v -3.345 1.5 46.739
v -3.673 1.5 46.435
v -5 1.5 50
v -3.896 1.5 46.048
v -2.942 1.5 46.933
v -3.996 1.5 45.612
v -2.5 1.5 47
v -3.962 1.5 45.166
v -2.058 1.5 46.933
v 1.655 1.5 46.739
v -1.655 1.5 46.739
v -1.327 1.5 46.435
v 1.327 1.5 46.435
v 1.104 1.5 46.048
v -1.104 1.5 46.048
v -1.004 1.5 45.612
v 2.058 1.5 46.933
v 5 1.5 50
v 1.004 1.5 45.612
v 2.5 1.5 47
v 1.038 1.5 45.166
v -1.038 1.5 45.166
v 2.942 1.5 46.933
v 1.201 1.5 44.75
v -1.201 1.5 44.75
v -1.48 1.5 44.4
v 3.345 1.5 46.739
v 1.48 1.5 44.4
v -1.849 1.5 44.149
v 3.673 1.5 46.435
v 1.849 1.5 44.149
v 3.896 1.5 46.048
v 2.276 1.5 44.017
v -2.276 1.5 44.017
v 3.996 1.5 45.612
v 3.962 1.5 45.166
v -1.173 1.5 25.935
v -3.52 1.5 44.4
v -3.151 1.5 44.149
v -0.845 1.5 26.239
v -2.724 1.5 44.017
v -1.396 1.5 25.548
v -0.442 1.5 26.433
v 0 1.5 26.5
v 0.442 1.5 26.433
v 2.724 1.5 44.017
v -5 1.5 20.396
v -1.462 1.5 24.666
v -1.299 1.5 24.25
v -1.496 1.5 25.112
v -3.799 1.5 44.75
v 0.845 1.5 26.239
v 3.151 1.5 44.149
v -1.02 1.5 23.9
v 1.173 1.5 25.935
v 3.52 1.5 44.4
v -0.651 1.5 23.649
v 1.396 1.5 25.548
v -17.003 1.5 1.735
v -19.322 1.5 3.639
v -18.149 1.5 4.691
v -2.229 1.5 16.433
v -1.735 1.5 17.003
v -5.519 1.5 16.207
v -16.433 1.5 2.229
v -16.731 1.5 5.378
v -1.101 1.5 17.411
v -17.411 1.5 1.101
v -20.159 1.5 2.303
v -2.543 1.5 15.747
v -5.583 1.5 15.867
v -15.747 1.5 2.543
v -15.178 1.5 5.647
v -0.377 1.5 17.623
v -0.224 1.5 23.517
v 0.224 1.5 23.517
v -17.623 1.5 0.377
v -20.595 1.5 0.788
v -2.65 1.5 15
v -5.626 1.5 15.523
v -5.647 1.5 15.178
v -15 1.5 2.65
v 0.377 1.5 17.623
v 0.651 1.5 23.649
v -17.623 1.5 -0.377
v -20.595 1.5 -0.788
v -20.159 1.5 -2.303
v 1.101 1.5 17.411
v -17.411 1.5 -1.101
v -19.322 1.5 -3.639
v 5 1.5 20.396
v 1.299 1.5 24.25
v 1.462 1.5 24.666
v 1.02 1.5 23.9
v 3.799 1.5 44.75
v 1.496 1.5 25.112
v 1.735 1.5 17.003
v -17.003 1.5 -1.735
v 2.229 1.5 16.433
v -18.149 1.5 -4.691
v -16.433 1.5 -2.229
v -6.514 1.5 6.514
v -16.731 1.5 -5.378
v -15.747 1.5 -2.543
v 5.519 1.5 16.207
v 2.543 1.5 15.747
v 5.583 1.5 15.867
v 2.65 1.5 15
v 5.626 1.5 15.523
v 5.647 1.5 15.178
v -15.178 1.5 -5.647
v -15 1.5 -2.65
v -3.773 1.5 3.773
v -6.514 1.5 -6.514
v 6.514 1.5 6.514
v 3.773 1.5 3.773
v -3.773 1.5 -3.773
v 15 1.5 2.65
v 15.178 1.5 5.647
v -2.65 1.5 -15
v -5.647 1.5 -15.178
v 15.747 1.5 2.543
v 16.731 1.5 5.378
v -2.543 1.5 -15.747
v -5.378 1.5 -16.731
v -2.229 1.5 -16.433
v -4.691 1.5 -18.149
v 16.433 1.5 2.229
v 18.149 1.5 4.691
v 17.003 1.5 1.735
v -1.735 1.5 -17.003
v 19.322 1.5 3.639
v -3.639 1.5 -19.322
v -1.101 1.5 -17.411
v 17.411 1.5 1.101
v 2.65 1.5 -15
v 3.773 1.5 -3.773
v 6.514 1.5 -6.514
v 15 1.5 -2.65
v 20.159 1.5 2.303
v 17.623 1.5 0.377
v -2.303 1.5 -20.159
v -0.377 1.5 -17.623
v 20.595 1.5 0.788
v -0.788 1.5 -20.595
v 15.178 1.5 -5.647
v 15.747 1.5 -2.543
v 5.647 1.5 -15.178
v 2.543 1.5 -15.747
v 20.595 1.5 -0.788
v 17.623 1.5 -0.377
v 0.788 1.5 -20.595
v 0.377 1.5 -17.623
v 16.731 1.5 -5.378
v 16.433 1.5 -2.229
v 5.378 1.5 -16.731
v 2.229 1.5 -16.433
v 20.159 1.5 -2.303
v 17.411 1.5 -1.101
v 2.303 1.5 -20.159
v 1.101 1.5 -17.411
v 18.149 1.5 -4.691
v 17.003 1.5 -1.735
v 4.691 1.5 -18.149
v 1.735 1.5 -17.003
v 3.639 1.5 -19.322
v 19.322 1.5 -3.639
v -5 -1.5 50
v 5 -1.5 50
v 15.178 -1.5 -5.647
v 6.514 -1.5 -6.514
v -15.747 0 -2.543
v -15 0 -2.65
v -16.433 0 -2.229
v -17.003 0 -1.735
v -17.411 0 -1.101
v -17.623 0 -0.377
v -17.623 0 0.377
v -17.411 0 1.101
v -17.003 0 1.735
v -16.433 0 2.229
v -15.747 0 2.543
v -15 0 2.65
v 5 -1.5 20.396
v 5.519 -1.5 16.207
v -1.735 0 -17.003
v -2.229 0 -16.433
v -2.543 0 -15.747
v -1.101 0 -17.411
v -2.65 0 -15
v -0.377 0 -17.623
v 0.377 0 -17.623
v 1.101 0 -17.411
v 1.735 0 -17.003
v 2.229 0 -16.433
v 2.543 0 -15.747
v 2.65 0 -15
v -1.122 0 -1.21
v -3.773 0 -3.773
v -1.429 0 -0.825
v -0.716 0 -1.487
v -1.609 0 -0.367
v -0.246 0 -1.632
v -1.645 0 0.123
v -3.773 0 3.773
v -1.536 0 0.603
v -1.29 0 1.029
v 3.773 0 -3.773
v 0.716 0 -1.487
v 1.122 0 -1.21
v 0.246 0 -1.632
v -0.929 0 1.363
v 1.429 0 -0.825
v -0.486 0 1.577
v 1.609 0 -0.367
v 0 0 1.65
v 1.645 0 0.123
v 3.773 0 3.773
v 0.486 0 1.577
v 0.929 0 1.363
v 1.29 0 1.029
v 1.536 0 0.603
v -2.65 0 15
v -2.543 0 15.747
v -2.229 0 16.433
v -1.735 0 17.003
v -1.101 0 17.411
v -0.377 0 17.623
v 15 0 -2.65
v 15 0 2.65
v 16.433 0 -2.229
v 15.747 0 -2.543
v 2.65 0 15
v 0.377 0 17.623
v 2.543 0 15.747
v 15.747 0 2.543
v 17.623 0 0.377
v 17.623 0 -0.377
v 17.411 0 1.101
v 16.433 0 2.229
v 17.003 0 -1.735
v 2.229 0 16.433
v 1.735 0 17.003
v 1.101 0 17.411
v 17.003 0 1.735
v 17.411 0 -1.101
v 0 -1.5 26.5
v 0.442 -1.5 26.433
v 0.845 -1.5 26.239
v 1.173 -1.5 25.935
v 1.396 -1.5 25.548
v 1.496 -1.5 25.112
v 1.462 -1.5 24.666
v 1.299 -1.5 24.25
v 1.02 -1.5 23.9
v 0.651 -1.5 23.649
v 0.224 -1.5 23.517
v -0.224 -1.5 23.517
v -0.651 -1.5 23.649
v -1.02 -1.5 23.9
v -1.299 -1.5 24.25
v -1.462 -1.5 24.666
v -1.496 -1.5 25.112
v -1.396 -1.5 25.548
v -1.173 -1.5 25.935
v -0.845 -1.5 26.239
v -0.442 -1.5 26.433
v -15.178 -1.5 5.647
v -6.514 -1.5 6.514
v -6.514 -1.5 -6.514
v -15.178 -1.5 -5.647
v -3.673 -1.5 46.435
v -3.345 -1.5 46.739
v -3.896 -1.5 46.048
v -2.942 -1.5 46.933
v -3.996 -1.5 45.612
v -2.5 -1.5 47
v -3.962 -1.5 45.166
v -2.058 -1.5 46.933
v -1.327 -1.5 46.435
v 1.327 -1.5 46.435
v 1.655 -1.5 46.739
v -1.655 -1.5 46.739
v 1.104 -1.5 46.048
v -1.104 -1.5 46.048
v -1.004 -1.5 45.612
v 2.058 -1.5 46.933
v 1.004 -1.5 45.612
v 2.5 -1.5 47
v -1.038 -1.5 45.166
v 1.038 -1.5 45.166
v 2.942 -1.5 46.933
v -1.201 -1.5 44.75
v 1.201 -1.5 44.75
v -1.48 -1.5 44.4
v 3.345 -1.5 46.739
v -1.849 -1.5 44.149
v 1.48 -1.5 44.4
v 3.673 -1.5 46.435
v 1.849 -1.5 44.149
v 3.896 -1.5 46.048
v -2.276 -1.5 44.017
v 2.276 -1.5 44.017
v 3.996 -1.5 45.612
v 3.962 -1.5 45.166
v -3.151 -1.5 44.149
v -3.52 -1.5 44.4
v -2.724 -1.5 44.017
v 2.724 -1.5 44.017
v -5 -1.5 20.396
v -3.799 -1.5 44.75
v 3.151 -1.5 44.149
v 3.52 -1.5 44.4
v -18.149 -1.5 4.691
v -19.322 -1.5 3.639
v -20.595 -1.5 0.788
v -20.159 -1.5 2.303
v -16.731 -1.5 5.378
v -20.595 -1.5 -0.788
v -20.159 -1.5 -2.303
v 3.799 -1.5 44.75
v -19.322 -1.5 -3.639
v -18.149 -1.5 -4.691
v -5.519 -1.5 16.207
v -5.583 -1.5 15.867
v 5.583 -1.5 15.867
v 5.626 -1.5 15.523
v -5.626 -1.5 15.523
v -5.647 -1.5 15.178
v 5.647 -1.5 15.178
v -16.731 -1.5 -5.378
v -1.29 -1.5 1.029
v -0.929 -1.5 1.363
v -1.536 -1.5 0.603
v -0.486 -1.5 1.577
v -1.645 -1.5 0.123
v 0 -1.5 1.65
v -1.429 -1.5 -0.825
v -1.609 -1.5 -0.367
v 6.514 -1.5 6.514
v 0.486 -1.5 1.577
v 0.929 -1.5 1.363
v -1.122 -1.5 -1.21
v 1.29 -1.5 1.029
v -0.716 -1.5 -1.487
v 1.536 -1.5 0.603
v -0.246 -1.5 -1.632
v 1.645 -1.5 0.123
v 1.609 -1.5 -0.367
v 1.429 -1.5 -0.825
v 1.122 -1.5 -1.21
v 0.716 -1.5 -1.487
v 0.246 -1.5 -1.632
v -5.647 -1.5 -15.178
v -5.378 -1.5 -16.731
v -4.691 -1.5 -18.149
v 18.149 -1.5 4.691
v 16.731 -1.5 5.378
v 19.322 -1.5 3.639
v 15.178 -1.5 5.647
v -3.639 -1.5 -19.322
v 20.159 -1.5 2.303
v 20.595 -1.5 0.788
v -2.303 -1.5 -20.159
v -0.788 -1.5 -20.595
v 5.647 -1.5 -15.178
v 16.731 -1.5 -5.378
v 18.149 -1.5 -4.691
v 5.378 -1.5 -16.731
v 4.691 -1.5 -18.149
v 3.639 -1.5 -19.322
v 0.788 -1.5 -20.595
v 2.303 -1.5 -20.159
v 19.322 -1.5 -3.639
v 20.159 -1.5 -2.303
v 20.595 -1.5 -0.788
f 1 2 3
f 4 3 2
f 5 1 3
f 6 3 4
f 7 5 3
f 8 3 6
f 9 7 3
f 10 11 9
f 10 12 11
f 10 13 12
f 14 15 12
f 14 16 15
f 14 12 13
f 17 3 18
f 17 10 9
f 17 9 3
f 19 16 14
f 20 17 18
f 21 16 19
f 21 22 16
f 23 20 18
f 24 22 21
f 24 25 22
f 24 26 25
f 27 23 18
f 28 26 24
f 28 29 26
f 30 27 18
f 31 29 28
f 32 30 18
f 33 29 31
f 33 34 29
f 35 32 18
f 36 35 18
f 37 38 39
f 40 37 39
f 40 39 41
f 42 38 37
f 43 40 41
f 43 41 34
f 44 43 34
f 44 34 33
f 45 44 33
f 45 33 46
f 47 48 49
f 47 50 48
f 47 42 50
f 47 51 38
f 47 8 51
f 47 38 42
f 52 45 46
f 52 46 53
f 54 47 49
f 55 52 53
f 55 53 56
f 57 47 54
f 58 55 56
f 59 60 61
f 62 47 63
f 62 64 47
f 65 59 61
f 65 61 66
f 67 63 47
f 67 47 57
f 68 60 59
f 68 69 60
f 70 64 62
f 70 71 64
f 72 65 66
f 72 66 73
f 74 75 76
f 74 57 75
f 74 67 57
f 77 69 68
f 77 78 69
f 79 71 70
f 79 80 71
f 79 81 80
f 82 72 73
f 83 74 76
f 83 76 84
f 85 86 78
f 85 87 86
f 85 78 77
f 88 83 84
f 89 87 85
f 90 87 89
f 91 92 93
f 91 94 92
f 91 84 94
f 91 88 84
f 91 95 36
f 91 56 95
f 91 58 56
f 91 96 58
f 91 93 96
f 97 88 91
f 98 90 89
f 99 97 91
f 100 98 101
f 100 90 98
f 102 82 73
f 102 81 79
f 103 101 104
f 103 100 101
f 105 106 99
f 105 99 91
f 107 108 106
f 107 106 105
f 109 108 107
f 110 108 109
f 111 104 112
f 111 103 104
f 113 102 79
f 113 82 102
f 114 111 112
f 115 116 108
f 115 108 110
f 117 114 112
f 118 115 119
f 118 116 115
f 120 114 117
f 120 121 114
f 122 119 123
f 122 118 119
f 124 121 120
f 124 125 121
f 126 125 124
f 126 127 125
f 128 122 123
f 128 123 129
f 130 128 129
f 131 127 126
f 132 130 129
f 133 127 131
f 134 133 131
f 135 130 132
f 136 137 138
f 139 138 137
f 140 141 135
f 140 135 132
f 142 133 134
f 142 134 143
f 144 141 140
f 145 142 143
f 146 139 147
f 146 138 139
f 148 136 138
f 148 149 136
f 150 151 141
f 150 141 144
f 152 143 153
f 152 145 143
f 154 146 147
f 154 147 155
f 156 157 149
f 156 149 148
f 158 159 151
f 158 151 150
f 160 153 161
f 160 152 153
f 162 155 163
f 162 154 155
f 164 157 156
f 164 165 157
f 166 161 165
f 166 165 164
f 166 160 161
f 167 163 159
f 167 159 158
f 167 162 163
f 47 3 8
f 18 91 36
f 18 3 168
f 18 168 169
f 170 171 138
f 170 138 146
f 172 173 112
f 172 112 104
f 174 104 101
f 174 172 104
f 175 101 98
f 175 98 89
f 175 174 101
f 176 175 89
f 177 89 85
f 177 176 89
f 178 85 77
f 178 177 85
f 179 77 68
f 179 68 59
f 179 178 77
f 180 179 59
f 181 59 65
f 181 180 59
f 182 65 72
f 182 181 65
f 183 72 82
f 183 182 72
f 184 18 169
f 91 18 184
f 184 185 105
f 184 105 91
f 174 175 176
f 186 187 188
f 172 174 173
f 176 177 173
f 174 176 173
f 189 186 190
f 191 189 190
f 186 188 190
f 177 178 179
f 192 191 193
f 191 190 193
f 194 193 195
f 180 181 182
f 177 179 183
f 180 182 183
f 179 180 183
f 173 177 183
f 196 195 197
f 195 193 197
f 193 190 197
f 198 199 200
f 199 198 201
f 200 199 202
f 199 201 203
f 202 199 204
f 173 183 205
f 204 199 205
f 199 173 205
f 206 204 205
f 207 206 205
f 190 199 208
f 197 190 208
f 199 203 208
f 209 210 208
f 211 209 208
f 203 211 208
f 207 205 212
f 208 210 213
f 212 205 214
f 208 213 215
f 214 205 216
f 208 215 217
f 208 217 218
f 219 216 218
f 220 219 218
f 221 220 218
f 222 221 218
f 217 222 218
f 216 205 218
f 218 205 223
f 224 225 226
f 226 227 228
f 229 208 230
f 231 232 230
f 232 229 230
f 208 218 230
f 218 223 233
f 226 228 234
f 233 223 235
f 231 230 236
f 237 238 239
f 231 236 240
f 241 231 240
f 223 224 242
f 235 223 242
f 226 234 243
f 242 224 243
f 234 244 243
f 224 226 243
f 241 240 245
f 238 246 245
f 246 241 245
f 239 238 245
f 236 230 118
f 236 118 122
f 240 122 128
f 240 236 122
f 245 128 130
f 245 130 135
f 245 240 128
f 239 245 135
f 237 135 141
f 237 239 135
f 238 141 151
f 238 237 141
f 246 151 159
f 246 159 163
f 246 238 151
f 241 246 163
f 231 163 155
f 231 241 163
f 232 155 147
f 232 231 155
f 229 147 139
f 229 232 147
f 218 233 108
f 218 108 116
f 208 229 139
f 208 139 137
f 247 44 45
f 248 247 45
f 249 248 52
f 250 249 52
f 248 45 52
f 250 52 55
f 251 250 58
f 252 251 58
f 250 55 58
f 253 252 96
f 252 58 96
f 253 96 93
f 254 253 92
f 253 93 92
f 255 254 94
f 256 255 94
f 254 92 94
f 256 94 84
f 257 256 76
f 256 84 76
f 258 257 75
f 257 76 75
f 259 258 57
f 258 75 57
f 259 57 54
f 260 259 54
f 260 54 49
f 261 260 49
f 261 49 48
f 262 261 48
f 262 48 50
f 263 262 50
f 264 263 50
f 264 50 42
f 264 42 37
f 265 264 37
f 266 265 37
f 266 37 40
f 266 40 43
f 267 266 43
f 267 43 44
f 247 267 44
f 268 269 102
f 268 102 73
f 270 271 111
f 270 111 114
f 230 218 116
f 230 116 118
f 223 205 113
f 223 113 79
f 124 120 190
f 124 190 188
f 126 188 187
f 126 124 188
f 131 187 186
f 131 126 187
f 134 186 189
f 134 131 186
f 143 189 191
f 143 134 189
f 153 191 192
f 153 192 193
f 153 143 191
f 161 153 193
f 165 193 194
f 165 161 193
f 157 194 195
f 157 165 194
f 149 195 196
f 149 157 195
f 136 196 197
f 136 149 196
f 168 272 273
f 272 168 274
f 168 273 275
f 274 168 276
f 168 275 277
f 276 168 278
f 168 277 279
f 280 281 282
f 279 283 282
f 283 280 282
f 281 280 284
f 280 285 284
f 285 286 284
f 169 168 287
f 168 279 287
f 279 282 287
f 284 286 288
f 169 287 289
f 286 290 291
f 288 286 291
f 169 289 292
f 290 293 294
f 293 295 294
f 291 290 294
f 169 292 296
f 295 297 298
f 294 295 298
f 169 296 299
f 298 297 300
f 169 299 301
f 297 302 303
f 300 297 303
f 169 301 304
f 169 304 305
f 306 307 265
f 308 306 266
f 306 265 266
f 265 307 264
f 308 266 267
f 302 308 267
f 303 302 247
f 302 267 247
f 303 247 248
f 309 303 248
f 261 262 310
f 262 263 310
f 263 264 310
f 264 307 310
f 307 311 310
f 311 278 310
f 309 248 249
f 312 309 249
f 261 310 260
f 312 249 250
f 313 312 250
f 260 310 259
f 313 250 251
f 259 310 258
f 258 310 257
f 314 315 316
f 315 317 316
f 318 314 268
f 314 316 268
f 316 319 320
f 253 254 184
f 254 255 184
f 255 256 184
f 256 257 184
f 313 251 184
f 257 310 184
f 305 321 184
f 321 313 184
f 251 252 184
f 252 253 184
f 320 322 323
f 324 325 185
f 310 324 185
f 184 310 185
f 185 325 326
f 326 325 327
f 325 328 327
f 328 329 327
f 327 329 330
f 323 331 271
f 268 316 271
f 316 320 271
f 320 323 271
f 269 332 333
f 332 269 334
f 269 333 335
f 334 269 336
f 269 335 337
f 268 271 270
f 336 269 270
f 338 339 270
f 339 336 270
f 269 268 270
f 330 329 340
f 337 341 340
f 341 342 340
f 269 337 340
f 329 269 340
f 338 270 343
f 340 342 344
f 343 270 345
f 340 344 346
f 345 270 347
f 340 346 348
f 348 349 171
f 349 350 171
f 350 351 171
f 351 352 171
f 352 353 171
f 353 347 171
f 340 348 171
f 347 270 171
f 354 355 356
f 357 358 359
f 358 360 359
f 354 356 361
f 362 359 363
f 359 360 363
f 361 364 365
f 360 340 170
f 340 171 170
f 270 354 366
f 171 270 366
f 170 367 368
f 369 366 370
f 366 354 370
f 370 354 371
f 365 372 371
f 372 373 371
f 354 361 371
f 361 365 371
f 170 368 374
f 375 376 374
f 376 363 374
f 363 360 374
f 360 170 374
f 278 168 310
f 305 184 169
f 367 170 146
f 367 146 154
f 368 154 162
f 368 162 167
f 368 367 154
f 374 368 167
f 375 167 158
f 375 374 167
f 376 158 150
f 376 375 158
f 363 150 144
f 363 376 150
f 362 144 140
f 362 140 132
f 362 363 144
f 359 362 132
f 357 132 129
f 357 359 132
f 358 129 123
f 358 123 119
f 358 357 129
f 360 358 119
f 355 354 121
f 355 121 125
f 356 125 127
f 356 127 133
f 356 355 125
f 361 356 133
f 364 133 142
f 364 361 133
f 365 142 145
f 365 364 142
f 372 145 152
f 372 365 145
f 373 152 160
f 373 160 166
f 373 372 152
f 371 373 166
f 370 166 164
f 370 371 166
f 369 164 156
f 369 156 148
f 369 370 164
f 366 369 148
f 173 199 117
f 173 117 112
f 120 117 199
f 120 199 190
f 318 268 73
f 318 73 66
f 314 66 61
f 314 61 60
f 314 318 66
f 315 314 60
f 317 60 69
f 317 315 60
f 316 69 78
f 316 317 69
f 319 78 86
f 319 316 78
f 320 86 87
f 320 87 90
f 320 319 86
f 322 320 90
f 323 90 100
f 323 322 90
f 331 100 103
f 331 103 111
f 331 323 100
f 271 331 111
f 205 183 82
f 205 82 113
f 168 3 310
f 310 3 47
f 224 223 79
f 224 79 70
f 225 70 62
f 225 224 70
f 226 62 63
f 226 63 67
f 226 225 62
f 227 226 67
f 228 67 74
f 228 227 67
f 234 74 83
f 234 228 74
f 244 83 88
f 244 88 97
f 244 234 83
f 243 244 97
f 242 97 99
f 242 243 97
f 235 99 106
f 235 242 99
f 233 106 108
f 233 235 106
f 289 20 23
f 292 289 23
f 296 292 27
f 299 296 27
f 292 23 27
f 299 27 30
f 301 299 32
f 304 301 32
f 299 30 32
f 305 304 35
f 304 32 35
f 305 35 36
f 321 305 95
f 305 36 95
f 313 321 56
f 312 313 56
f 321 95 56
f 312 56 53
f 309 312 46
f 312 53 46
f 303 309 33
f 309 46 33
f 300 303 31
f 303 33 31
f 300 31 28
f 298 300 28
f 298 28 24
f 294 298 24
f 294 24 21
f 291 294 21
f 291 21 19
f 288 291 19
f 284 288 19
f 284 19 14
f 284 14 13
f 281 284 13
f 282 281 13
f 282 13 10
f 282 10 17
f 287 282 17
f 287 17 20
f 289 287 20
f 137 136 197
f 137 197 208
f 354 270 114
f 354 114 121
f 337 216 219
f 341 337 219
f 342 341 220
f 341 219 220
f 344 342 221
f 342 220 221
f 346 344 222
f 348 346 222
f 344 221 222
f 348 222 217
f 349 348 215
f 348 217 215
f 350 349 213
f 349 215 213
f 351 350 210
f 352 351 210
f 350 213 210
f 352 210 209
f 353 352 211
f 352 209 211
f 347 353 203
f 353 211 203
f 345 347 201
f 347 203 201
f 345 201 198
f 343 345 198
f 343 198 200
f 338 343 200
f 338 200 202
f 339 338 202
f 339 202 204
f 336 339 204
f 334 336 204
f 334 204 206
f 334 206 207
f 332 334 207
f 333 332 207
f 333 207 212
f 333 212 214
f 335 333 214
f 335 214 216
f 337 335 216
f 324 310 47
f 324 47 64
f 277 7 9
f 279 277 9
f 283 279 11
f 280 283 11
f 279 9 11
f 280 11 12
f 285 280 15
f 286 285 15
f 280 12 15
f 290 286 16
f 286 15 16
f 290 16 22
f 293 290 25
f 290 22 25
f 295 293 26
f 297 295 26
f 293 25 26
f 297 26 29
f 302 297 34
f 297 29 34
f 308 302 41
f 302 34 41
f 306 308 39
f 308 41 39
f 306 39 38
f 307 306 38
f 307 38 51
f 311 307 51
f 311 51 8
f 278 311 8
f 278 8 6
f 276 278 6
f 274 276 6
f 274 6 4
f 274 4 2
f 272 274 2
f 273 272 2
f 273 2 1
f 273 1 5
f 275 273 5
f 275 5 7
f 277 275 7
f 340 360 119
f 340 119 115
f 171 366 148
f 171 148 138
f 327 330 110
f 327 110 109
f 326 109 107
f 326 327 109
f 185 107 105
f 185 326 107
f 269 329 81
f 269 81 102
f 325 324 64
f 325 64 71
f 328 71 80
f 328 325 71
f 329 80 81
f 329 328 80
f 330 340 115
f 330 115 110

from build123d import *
from build123d.topology import SkipClean

# Parameters (mm, degrees)
SKETCH1_R               = 21
BOSS_EXTRUDE1_DEPTH     = 1.5
SKETCH2_R               = 2.65
CUT_EXTRUDE1_DEPTH      = 1.5
SKETCH5_W               = 10
SKETCH5_H               = 50
BOSS_EXTRUDE2_DEPTH     = 1.5
CIRPATTERN1_DEPTH       = 1.5
CUT_EXTRUDE4_REACH      = 56.252
SKETCH4_R               = 1.65
CUT_EXTRUDE5_REACH      = 56.314
SKETCH6_R               = 1.5
CUT_EXTRUDE6_DEPTH      = 55.251728083
CUT_EXTRUDE6_DEPTH_BACK = 55.251728083
CUT_EXTRUDE8_REACH      = 56.18
SKETCH9_R               = 1.5


# Read off the part's stored shape, not the designer's step: CirPattern1
with BuildPart() as part:
    # Sketch1 → Boss-Extrude1 (new, symmetric)
    with BuildSketch(Plane(origin=(0, 0, 0), x_dir=(1, 0, 0), z_dir=(0, 1, 0))):
        with Locations(Location((0, 0, 0), (0, 0, 270))):
            Circle(SKETCH1_R)
    extrude(amount=BOSS_EXTRUDE1_DEPTH, both=True)

    # Sketch2 → Cut-Extrude1 (cut)
    with BuildSketch(Plane(origin=(0, 1.5, 0), x_dir=(1, 0, 0), z_dir=(0, 1, 0))):
        with Locations((0, -15)):
            Circle(SKETCH2_R)
        with BuildLine():
            ThreePointArc((-2.65, -15), (0, -12.35), (2.65, -15))
            Line((2.65, -15), (4.067821782, -0.821782178))
            ThreePointArc((4.067821782, -0.821782178), (0, -4.15), (-4.067821782, -0.821782178))
            Line((-4.067821782, -0.821782178), (-2.65, -15))
        make_face()
        with BuildLine():
            ThreePointArc((-4.067821782, -0.821782178), (0, -4.15), (4.067821782, -0.821782178))
            Line((4.067821782, -0.821782178), (4.15, 0))
            ThreePointArc((4.15, 0), (0, 4.15), (-4.15, 0))
            Line((-4.15, 0), (-4.067821782, -0.821782178))
        make_face()
    cut_extrude1 = extrude(amount=-CUT_EXTRUDE1_DEPTH, mode=Mode.SUBTRACT)

    # Sketch5 → Boss-Extrude2 (add, symmetric)
    with BuildSketch(Plane(origin=(0, 0, 0), x_dir=(1, 0, 0), z_dir=(0, 1, 0))):
        with Locations((0, -25)):
            Rectangle(SKETCH5_W, SKETCH5_H)
    extrude(amount=BOSS_EXTRUDE2_DEPTH, both=True)

    # Mirror1: Cut-Extrude1 across plane
    with SkipClean():  # the faces are left unmerged after this step: merging them gives an invalid solid
        add(cut_extrude1.mirror(Plane.XY), mode=Mode.SUBTRACT)

    # CirPattern1 outline → CirPattern1 (cut)
    with BuildSketch(Plane(origin=(0, 0, 0), x_dir=(1, 0, 0), z_dir=(0, 1, 0))):
        with BuildLine():
            Line((3.772727273, -3.772727273), (15, -2.65))
            ThreePointArc((15, -2.65), (17.65, 0), (15, 2.65))
            Line((15, 2.65), (3.772727273, 3.772727273))
            Line((3.772727273, 3.772727273), (4.067821782, 0.821782178))
            ThreePointArc((4.067821782, 0.821782178), (0, -4.15), (-4.067821782, 0.821782178))
            Line((-4.067821782, 0.821782178), (-3.772727273, 3.772727273))
            Line((-3.772727273, 3.772727273), (-15, 2.65))
            ThreePointArc((-15, 2.65), (-17.65, 0), (-15, -2.65))
            Line((-15, -2.65), (-3.772727273, -3.772727273))
            Line((-3.772727273, -3.772727273), (-2.65, -15))
            ThreePointArc((-2.65, -15), (0, -17.65), (2.65, -15))
            Line((2.65, -15), (3.772727273, -3.772727273))
        make_face()
    extrude(amount=CIRPATTERN1_DEPTH, mode=Mode.SUBTRACT)

    # Sketch4 → Cut-Extrude4 (cut, up to next)
    with BuildSketch(Plane(origin=(0, 0, 0), x_dir=(1, 0, 0), z_dir=(0, 1, 0)), mode=Mode.PRIVATE) as cut_extrude4_sk1:
        with Locations(Location((0, 0, 0), (0, 0, 270))):
            Circle(SKETCH4_R)
    cut_extrude4_tool1 = extrude(cut_extrude4_sk1.sketch, amount=-CUT_EXTRUDE4_REACH, mode=Mode.PRIVATE) & part.part
    add(cut_extrude4_tool1.solids().sort_by_distance((0, 0, 0))[0], mode=Mode.SUBTRACT)

    # Sketch6 → Cut-Extrude5 (cut, up to next)
    with BuildSketch(Plane(origin=(0, 1.5, 0), x_dir=(1, 0, 0), z_dir=(0, 1, 0)), mode=Mode.PRIVATE) as cut_extrude5_sk1:
        with Locations(Location((2.5, -45.5, 0), (0, 0, 270))):
            Circle(SKETCH6_R)
    cut_extrude5_tool1 = extrude(cut_extrude5_sk1.sketch, amount=-CUT_EXTRUDE5_REACH, mode=Mode.PRIVATE) & part.part
    # Sketch6 → Cut-Extrude5 (cut, up to next)
    with BuildSketch(Plane(origin=(0, 1.5, 0), x_dir=(1, 0, 0), z_dir=(0, 1, 0)), mode=Mode.PRIVATE) as cut_extrude5_sk2:
        with Locations(Location((-2.5, -45.5, 0), (0, 0, 270))):
            Circle(SKETCH6_R)
    cut_extrude5_tool2 = extrude(cut_extrude5_sk2.sketch, amount=-CUT_EXTRUDE5_REACH, mode=Mode.PRIVATE) & part.part
    add(cut_extrude5_tool1.solids().sort_by_distance((2.5, 1.5, 45.5))[0], mode=Mode.SUBTRACT)
    add(cut_extrude5_tool2.solids().sort_by_distance((-2.5, 1.5, 45.5))[0], mode=Mode.SUBTRACT)

    # Sketch7 → Cut-Extrude6 (cut, two sides: drawn at the far end of the back side and taken through both)
    with BuildSketch(Plane(origin=(0, 0, 0), x_dir=(1, 0, 0), z_dir=(0, 1, 0)).offset(-CUT_EXTRUDE6_DEPTH_BACK)):
        with BuildLine():
            ThreePointArc((5, -20.396078054), (0, 21), (-5, -20.396078054))
            Line((-5, -20.396078054), (-5.519486194, -16.207382355))
            ThreePointArc((-5.519486194, -16.207382355), (-5.607043009, -15.695391034), (-5.647210443, -15.177522436))
            Line((-5.647210443, -15.177522436), (-6.513602442, -6.513602442))
            Line((-6.513602442, -6.513602442), (-15.177522436, -5.647210443))
            ThreePointArc((-15.177522436, -5.647210443), (-20.65, 0), (-15.177522436, 5.647210443))
            Line((-15.177522436, 5.647210443), (-6.513602442, 6.513602442))
            Line((-6.513602442, 6.513602442), (-5.647210443, 15.177522436))
            ThreePointArc((-5.647210443, 15.177522436), (0, 20.65), (5.647210443, 15.177522436))
            Line((5.647210443, 15.177522436), (6.513602442, 6.513602442))
            Line((6.513602442, 6.513602442), (15.177522436, 5.647210443))
            ThreePointArc((15.177522436, 5.647210443), (20.65, 0), (15.177522436, -5.647210443))
            Line((15.177522436, -5.647210443), (6.513602442, -6.513602442))
            Line((6.513602442, -6.513602442), (5.647210443, -15.177522436))
            ThreePointArc((5.647210443, -15.177522436), (5.607043009, -15.695391034), (5.519486194, -16.207382355))
            Line((5.519486194, -16.207382355), (5, -20.396078054))
        make_face()
    extrude(amount=CUT_EXTRUDE6_DEPTH + CUT_EXTRUDE6_DEPTH_BACK, mode=Mode.SUBTRACT)

    # Sketch9 → Cut-Extrude8 (cut, up to next)
    with BuildSketch(Plane(origin=(0, 1.5, 0), x_dir=(1, 0, 0), z_dir=(0, 1, 0)), mode=Mode.PRIVATE) as cut_extrude8_sk1:
        with Locations(Location((0, -25, 0), (0, 0, 270))):
            Circle(SKETCH9_R)
    cut_extrude8_tool1 = extrude(cut_extrude8_sk1.sketch, amount=-CUT_EXTRUDE8_REACH, mode=Mode.PRIVATE) & part.part
    add(cut_extrude8_tool1.solids().sort_by_distance((0, 1.5, 25))[0], mode=Mode.SUBTRACT)


solid = part.part
